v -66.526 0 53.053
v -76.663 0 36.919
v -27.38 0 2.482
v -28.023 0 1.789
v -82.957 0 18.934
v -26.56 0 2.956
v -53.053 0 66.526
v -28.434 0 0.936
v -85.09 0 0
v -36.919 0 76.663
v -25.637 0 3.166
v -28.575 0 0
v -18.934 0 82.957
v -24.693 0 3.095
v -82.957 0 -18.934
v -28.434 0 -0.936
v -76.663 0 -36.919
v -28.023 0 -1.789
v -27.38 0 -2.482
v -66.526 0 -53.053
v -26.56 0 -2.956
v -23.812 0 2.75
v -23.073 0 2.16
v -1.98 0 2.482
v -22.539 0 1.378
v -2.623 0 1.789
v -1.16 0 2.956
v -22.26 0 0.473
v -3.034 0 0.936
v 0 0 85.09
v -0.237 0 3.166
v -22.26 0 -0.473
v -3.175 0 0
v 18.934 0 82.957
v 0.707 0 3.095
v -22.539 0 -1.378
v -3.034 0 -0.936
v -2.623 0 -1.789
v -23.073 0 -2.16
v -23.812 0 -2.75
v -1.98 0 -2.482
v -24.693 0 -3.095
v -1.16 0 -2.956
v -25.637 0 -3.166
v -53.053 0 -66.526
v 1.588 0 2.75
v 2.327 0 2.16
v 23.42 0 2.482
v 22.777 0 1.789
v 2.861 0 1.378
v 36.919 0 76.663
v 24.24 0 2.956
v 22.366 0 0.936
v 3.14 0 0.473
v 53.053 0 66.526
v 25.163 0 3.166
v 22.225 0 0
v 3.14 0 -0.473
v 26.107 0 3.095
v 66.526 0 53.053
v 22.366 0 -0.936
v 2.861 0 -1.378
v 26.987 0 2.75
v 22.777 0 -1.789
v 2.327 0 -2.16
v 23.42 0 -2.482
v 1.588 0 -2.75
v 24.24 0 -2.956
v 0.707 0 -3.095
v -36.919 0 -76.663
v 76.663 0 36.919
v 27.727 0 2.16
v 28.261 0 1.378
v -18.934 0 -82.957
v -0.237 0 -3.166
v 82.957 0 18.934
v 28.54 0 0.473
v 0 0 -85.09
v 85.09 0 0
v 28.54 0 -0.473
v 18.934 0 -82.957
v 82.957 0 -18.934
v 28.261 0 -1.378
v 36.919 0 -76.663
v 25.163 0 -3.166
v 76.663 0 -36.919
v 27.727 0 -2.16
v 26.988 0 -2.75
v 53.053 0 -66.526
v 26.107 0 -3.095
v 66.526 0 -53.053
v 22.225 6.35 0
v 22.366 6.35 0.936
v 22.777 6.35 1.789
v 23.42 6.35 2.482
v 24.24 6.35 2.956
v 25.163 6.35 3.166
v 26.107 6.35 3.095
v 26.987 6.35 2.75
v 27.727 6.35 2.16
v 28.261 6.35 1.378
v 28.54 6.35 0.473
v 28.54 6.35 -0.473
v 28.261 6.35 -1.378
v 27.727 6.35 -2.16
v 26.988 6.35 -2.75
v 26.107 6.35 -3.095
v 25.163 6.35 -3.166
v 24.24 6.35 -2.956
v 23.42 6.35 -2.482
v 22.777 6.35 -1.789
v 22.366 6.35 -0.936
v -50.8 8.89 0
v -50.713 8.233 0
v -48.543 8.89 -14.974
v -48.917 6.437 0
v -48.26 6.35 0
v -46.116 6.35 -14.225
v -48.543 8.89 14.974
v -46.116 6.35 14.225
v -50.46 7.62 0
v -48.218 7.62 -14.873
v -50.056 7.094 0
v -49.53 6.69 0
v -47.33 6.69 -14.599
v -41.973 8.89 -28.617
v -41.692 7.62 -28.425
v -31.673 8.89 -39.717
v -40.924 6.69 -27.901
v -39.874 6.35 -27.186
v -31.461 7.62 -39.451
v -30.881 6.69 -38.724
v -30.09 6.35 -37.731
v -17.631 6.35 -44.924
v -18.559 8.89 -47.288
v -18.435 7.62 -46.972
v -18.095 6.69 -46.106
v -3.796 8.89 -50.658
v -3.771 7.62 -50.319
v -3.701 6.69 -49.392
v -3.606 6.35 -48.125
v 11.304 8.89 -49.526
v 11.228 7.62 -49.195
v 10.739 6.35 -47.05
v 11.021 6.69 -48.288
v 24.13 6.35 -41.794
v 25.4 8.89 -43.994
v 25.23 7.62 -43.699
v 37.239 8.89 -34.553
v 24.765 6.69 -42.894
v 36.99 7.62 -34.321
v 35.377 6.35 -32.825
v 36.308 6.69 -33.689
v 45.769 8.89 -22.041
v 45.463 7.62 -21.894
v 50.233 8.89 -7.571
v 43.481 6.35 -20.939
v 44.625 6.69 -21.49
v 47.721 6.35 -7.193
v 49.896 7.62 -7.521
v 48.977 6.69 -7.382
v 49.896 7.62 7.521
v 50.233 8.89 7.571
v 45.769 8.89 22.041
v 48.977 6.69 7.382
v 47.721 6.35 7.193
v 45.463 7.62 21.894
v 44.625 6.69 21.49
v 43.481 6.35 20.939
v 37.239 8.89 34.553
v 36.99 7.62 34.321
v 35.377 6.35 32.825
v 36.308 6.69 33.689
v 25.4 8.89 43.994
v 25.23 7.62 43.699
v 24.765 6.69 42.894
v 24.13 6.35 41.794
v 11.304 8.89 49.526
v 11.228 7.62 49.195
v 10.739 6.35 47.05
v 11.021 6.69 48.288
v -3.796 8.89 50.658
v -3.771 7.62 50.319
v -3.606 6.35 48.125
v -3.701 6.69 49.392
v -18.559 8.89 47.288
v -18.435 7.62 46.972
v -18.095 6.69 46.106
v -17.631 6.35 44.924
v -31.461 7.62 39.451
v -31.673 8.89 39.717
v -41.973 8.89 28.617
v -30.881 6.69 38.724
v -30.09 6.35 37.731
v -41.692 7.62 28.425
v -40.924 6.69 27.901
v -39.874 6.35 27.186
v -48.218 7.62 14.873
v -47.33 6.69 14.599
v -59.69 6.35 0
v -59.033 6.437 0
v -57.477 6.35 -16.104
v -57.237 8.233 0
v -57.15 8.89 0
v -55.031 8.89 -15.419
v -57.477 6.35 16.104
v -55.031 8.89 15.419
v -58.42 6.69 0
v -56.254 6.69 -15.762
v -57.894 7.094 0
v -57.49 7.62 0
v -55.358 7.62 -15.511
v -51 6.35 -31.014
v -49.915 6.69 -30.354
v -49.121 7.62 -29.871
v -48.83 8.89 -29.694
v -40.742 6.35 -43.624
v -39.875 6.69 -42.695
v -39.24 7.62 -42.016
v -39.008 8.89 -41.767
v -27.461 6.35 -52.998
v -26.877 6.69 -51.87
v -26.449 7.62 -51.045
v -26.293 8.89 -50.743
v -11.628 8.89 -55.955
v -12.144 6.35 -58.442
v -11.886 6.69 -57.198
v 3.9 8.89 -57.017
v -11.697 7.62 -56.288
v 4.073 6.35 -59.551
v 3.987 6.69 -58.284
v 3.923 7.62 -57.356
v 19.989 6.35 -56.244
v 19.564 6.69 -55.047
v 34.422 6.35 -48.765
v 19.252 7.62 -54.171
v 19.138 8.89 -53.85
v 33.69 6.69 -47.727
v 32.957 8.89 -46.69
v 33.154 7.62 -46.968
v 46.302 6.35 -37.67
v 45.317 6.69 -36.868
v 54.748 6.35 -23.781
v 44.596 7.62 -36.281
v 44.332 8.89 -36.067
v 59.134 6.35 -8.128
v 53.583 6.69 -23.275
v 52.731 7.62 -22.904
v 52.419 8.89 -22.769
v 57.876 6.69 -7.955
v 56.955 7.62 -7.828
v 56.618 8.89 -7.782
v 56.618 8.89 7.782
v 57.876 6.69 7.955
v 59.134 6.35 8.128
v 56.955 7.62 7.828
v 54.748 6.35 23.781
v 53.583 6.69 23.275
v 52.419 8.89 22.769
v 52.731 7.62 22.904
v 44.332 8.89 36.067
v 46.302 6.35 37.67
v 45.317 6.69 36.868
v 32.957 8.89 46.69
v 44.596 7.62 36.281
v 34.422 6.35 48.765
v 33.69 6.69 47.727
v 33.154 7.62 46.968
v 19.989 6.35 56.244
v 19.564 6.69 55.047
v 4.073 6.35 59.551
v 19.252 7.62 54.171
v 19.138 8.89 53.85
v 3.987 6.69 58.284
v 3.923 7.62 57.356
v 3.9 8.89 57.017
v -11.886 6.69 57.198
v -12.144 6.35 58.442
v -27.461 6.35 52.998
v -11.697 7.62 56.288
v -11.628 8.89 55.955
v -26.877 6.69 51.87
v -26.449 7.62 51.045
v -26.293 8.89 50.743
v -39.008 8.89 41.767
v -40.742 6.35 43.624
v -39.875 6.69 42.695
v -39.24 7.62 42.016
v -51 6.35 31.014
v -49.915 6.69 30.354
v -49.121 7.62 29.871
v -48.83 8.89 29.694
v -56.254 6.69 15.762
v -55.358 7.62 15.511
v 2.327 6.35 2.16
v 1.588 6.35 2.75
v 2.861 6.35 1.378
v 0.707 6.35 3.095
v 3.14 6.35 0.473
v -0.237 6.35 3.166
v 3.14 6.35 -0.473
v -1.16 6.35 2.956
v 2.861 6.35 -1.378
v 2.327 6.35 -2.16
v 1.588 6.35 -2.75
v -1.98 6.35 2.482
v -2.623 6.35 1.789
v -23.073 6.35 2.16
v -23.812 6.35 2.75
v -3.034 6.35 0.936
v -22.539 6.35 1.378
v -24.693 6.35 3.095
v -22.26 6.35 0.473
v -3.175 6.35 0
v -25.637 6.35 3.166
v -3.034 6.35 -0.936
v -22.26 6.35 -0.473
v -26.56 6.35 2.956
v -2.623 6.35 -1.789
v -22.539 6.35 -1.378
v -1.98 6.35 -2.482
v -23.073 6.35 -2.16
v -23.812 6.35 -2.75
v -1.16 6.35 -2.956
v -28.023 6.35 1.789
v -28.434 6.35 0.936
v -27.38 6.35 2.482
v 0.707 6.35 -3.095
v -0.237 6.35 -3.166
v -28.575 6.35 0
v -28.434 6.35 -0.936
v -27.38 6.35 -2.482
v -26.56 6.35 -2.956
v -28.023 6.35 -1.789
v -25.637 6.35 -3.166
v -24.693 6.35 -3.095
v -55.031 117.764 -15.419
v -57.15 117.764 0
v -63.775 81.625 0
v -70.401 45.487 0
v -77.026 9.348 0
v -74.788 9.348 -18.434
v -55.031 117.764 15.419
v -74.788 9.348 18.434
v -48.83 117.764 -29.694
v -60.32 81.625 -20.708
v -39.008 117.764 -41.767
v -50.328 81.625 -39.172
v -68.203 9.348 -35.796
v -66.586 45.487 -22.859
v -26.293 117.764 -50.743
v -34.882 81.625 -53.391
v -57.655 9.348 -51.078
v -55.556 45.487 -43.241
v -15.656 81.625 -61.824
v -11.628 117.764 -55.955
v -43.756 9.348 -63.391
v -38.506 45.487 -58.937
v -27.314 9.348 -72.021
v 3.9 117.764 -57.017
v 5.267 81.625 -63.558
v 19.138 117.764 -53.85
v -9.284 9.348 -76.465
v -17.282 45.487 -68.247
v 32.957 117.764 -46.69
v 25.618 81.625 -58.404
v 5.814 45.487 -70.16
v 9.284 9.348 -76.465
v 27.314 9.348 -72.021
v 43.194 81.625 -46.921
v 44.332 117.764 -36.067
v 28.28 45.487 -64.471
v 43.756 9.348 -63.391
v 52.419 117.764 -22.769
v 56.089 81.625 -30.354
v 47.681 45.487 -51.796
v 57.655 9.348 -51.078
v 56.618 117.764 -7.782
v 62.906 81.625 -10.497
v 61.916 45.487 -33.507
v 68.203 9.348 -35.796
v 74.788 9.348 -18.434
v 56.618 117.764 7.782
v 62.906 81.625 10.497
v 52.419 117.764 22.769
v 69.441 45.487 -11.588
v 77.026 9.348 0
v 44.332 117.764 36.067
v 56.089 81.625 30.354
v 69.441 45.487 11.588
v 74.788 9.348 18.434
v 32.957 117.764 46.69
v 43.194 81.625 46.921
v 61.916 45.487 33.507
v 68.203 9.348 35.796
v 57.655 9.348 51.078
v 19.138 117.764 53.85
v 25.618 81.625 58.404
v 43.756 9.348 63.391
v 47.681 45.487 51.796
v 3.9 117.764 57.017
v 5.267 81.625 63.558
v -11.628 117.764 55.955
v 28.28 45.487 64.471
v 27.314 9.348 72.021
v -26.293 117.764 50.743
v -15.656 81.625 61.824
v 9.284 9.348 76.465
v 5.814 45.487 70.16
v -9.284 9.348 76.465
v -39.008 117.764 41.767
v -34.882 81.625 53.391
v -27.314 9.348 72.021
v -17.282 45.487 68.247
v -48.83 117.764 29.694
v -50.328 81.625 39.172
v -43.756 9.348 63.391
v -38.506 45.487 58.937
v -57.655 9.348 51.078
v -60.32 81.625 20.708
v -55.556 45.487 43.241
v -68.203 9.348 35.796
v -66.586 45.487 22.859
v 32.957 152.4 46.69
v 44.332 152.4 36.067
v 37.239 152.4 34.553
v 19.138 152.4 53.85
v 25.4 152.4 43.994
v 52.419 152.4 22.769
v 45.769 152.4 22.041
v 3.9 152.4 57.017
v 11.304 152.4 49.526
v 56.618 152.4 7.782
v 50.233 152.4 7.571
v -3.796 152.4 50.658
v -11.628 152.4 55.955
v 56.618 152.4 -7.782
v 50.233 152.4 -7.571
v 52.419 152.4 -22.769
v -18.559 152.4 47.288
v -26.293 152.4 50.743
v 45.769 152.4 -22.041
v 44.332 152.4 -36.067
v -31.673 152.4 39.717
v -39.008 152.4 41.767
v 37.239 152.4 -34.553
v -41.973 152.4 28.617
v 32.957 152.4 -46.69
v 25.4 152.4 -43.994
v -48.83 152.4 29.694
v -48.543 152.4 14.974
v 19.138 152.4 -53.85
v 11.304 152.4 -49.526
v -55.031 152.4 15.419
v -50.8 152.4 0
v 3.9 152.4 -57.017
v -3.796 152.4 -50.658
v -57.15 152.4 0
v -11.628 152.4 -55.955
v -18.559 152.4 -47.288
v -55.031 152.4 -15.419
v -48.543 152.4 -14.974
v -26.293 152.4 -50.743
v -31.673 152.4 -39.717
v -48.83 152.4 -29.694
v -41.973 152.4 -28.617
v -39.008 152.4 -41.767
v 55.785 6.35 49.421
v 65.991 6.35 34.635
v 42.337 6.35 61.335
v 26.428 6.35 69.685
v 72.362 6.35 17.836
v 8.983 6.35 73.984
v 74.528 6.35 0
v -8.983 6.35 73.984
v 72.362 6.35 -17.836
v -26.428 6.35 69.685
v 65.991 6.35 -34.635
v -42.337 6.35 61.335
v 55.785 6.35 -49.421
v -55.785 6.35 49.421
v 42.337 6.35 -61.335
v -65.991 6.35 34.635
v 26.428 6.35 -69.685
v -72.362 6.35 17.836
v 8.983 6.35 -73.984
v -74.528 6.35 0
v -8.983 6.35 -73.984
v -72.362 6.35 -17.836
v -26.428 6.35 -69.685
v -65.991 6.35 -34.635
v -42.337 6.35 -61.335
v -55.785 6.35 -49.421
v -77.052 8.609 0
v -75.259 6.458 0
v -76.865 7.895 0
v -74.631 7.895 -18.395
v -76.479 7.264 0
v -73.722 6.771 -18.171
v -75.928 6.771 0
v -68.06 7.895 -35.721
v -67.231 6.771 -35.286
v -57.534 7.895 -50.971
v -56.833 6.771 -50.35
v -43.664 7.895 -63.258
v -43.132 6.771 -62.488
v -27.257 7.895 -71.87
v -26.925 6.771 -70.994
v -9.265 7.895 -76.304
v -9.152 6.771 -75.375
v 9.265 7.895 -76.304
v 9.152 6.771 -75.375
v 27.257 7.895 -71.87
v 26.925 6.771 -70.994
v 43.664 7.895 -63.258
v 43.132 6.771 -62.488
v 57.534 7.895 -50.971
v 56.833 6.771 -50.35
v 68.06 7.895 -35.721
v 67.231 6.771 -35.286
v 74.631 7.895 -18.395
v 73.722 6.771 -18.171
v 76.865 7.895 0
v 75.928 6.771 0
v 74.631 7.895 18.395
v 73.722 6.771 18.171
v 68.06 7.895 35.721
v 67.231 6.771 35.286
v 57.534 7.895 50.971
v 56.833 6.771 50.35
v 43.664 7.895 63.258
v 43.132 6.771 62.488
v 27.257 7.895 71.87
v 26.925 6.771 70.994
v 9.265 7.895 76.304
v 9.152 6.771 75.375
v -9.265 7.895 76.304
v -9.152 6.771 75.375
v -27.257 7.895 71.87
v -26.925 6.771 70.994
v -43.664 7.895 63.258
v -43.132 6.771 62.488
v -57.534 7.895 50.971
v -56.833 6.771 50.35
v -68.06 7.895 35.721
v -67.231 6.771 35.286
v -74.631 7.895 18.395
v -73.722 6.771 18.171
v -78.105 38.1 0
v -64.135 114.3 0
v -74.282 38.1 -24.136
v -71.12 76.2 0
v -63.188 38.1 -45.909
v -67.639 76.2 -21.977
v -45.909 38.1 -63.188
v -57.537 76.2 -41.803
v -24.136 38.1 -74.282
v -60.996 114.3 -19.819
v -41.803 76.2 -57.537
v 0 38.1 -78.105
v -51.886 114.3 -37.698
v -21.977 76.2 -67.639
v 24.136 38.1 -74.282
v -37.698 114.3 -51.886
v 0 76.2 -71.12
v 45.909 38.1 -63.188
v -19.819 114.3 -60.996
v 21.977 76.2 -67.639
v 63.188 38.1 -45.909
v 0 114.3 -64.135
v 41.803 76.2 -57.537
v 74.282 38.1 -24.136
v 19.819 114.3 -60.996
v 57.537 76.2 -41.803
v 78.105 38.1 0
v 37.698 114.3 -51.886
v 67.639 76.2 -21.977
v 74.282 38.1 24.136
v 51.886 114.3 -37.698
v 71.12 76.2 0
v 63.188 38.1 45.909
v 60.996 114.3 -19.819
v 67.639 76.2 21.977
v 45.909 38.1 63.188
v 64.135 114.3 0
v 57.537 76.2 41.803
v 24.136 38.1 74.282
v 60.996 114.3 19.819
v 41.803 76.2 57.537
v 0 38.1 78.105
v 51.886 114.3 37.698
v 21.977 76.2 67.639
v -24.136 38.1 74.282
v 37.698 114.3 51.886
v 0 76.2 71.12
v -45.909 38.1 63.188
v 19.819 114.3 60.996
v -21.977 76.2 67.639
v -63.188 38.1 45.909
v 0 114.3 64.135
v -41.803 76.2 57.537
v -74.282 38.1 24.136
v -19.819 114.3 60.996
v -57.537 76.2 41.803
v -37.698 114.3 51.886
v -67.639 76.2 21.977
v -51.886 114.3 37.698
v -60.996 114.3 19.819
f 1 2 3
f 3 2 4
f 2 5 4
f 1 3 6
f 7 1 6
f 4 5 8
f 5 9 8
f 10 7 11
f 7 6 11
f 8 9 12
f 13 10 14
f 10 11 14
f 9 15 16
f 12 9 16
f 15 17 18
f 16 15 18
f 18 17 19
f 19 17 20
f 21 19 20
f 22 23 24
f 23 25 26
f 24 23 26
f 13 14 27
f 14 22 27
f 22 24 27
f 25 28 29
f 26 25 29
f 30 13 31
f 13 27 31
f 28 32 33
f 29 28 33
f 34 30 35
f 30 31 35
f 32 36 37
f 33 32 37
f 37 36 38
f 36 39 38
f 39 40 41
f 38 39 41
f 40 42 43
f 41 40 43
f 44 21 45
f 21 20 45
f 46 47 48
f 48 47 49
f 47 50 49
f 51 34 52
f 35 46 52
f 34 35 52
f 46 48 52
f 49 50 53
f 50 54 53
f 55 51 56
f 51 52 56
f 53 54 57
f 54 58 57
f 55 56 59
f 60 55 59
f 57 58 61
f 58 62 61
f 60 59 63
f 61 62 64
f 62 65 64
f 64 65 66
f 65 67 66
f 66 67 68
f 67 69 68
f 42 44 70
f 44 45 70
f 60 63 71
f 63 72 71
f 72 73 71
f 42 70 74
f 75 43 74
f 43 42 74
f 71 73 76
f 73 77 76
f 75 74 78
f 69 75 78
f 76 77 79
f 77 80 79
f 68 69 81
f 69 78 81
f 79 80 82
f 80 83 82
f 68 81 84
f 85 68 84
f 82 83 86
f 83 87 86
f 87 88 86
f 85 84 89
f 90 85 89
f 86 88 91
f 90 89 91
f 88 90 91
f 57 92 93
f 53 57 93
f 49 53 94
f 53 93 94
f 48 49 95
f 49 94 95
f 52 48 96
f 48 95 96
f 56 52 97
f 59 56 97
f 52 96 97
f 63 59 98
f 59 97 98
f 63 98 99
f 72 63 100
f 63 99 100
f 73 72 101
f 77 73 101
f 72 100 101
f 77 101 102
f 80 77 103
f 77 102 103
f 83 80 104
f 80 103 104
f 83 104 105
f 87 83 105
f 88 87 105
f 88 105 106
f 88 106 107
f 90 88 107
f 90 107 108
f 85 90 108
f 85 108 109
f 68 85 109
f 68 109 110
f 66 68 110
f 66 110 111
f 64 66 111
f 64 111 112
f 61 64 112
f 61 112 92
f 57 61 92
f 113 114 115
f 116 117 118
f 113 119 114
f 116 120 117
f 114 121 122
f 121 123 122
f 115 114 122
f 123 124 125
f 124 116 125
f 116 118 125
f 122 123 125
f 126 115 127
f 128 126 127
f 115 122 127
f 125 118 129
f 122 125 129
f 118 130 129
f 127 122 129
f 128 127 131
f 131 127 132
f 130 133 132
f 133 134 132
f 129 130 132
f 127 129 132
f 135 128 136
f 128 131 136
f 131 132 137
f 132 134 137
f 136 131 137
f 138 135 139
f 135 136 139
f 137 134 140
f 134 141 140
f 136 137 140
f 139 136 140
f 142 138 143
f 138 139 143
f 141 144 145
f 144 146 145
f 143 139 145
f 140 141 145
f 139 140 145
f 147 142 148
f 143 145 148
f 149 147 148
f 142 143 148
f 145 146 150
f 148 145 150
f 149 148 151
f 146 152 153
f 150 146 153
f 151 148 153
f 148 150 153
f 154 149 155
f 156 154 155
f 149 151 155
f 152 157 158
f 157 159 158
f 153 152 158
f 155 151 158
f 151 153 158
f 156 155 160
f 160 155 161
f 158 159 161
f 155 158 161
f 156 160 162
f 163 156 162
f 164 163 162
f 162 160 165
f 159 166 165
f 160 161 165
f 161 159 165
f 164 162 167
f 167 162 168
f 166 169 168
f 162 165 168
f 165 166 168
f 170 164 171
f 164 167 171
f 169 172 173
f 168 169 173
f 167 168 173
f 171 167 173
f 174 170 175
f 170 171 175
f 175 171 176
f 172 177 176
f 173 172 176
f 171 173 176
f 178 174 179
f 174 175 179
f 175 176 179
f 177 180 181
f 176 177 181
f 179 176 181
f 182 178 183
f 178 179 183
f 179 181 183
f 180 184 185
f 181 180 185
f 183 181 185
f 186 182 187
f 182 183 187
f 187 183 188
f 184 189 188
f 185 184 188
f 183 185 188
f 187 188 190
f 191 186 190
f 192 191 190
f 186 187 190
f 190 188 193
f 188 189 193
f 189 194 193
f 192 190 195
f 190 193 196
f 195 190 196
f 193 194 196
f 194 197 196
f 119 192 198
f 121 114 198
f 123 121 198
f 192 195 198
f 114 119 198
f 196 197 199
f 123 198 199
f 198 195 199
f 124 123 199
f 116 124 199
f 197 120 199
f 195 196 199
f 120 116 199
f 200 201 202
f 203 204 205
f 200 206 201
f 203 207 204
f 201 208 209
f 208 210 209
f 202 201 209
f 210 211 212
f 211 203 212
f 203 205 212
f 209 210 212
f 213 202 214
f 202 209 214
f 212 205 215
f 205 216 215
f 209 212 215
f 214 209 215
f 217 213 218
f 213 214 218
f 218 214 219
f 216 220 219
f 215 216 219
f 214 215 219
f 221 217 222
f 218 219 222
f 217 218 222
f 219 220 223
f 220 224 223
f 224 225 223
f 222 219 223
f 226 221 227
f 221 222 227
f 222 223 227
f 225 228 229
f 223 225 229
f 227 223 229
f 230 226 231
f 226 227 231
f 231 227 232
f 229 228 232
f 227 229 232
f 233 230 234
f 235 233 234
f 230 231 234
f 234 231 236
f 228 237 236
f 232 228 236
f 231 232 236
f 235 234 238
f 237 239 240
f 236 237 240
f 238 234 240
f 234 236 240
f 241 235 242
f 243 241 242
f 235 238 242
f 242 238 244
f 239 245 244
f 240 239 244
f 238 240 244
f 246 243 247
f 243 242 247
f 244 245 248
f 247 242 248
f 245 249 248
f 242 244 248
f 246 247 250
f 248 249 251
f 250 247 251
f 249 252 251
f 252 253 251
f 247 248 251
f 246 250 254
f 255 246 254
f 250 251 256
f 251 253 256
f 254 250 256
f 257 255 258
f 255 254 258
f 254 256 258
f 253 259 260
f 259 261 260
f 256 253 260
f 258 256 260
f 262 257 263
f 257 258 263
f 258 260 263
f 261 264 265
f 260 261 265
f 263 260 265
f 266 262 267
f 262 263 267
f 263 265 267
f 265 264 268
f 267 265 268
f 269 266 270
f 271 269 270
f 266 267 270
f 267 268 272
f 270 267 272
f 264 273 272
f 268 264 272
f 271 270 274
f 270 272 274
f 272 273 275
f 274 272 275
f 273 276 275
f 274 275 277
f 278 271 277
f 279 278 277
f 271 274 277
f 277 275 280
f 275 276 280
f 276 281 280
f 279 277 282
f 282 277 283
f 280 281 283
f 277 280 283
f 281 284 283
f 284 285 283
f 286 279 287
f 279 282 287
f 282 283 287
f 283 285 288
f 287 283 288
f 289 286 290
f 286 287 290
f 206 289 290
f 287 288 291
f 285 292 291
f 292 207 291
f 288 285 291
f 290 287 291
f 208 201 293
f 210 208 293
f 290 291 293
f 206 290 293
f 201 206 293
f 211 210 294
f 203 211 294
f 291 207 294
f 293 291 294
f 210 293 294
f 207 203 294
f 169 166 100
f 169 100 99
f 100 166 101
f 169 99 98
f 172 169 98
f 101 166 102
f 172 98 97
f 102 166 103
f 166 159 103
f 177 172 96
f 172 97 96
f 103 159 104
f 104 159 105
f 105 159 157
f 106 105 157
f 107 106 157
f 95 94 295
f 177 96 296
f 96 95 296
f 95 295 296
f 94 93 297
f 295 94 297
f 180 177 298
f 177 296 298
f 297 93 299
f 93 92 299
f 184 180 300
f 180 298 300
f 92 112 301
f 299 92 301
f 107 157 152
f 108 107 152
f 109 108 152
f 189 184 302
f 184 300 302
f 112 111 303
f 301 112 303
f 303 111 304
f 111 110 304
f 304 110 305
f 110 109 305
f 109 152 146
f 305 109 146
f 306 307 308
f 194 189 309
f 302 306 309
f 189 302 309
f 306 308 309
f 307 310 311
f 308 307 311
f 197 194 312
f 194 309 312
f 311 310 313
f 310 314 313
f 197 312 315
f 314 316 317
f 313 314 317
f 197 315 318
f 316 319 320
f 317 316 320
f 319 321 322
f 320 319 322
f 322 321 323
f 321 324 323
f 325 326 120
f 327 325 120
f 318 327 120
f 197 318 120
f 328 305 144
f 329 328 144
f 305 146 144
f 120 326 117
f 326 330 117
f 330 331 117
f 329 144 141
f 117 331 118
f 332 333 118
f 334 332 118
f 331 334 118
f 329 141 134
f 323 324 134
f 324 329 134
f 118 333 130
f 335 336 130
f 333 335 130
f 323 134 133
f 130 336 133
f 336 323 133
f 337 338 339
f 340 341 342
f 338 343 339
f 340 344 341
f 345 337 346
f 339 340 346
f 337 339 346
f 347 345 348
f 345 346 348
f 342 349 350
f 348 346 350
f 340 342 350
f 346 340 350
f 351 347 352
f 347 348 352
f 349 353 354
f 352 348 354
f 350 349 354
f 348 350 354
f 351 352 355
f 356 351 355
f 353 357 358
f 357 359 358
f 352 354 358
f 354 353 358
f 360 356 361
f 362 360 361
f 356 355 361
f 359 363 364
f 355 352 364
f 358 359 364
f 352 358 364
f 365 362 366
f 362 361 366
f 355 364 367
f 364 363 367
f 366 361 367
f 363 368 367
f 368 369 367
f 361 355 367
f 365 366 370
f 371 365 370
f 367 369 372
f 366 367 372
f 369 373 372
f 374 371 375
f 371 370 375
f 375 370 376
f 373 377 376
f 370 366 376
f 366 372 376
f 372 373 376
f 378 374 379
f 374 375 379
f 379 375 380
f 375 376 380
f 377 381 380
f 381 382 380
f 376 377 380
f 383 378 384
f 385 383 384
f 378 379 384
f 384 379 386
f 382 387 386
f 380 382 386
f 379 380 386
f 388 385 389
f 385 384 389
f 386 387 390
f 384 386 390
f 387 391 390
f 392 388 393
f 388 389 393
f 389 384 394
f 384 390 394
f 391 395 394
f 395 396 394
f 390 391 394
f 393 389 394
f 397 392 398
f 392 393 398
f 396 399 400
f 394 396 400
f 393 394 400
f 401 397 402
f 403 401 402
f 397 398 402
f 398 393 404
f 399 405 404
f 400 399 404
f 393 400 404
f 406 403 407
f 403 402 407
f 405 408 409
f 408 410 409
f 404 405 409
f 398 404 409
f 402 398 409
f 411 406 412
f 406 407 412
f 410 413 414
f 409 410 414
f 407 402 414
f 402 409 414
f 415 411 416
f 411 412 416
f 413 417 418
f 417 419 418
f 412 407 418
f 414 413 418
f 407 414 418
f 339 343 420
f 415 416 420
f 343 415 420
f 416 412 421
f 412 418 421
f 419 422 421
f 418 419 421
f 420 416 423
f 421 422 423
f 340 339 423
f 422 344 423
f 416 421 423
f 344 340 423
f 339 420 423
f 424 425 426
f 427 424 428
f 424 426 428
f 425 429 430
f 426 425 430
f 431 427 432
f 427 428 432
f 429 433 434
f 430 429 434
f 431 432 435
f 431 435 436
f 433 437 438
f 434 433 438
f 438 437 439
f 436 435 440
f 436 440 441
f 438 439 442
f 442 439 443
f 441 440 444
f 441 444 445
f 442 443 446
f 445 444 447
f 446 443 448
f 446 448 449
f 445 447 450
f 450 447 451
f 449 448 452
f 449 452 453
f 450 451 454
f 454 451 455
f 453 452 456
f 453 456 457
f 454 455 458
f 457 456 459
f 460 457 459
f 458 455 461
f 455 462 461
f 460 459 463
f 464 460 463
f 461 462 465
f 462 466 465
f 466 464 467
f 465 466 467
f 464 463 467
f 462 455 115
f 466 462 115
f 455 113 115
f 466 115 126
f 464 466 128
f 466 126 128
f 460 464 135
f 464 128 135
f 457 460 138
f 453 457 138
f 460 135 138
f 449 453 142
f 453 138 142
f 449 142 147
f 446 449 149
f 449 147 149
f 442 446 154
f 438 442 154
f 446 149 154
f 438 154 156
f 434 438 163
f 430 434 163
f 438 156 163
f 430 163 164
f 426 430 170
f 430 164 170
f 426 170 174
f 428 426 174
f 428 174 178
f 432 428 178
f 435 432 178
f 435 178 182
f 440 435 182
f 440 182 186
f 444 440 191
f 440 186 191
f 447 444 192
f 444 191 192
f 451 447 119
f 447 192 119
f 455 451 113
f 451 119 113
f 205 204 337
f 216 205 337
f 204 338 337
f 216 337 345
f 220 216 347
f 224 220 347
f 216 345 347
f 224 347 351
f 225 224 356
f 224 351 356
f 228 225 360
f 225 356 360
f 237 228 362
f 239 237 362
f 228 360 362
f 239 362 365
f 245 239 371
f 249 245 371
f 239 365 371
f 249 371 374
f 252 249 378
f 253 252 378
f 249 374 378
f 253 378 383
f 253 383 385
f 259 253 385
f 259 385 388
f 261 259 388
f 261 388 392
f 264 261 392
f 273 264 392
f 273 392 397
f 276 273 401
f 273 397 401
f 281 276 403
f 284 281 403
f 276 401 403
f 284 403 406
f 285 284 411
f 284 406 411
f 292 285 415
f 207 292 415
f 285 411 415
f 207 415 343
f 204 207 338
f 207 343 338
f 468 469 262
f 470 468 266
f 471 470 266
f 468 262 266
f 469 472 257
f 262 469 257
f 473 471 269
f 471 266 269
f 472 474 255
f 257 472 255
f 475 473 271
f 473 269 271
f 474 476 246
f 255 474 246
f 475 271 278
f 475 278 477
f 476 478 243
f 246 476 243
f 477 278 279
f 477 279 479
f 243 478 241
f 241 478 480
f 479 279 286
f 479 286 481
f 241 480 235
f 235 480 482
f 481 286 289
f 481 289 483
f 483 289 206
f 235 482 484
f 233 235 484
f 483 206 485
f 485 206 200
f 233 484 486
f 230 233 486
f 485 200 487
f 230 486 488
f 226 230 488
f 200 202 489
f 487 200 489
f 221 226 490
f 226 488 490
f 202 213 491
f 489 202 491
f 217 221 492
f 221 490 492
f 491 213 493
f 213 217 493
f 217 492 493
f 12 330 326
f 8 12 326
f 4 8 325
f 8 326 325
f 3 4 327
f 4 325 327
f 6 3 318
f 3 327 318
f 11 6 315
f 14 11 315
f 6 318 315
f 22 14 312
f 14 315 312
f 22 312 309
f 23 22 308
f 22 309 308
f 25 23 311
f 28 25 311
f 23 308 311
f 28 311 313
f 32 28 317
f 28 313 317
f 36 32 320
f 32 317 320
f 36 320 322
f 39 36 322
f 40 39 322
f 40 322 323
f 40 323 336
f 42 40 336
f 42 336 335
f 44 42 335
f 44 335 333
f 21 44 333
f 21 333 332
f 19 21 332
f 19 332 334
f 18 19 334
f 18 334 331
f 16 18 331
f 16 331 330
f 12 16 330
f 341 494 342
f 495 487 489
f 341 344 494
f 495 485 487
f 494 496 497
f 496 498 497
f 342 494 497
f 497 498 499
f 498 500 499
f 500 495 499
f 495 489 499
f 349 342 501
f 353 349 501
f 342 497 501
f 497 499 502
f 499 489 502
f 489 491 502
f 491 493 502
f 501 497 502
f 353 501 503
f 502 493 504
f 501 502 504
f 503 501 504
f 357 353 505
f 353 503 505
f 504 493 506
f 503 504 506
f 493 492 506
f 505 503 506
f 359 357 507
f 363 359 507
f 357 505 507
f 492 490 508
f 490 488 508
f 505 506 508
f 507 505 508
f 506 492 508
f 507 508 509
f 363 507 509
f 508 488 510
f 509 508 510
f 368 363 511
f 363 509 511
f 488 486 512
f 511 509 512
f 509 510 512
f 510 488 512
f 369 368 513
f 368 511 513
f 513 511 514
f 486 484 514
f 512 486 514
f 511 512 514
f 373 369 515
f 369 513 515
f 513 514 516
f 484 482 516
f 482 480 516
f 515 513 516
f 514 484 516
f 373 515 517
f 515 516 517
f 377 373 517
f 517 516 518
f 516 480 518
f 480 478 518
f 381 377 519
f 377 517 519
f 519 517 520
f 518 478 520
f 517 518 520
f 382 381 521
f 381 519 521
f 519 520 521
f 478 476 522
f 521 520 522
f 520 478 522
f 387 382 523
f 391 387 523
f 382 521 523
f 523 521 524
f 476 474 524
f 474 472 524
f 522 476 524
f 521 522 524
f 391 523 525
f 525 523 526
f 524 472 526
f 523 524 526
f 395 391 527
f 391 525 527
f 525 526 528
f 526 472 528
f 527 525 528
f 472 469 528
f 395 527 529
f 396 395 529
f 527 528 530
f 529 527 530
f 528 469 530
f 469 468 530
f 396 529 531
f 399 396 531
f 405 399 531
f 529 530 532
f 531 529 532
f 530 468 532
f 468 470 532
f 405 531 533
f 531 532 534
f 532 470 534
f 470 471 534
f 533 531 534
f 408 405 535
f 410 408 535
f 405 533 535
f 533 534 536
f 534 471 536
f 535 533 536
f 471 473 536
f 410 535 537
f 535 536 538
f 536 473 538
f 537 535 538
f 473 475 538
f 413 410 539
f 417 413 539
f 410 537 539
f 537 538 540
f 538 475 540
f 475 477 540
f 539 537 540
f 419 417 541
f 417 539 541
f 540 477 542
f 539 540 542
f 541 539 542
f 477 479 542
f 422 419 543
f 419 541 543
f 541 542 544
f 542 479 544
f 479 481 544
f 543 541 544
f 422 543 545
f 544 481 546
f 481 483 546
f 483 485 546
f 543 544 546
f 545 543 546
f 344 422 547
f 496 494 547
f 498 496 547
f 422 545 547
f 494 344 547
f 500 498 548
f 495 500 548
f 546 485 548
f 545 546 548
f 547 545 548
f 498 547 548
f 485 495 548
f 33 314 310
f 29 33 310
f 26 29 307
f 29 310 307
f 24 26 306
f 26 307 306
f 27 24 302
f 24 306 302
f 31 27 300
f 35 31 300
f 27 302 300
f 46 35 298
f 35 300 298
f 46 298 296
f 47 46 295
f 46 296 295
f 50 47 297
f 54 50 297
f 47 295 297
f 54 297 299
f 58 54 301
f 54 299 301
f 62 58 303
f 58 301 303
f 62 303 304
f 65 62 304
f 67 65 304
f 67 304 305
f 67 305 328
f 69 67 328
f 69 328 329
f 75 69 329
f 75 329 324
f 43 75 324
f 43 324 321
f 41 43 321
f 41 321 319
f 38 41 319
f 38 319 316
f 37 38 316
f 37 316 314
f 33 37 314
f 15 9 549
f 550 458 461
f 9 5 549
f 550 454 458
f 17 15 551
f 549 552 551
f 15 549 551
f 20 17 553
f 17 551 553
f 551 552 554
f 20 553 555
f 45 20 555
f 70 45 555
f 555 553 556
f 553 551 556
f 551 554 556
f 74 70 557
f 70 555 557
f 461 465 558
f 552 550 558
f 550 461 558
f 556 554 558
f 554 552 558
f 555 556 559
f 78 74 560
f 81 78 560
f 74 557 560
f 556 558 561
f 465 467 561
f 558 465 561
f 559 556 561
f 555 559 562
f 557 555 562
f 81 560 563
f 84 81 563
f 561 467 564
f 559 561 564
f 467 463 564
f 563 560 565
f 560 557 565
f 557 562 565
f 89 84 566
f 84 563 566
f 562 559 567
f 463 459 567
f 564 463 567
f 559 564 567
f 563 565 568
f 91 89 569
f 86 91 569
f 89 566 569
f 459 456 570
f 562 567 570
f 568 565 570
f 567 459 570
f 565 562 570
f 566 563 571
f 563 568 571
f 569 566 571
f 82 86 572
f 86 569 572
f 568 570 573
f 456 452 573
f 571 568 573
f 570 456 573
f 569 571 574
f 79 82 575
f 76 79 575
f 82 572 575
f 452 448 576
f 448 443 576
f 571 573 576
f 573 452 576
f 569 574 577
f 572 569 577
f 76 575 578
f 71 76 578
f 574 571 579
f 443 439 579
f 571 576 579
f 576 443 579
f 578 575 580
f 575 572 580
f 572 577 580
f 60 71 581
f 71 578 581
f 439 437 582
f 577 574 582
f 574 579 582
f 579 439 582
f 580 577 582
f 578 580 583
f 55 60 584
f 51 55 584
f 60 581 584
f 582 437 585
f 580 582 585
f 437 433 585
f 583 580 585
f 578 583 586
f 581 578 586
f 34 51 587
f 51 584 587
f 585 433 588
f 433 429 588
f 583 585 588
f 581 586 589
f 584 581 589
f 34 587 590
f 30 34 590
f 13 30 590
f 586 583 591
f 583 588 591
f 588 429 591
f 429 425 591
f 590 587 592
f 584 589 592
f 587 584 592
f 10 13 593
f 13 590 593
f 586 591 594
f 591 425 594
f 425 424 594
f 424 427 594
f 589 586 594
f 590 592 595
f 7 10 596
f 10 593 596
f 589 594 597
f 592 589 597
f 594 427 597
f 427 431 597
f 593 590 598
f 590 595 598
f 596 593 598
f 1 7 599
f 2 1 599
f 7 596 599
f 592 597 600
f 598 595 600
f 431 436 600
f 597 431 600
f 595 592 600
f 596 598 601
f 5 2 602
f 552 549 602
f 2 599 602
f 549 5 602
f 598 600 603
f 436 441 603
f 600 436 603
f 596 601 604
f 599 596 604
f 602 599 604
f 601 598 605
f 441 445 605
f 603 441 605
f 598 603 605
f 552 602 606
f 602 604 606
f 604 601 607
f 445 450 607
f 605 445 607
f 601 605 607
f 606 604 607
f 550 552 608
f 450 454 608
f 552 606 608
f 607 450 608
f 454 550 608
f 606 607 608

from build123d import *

# Parameters (mm, degrees)
CUT_EXTRUDE1_REACH = 191.239
SKETCH2_R          = 3.175


with BuildPart() as part:
    # Sketch1 → Revolve1 (revolve)
    with BuildSketch(Plane.XY):
        with BuildLine():
            Line((0, 0), (-78.74, 0))
            Line((-78.74, 0), (-85.09, 0))
            Line((-85.09, 0), (-57.15, 152.4))
            Line((-57.15, 152.4), (-50.8, 152.4))
            Line((-50.8, 152.4), (-50.8, 8.89))
            ThreePointArc((-50.8, 8.89), (-50.056051224, 7.093948776), (-48.26, 6.35))
            Line((-48.26, 6.35), (0, 6.35))
            Line((0, 6.35), (0, 0))
        make_face()
        with BuildLine():
            Line((-57.15, 8.89), (-57.15, 117.763636364))
            Line((-57.15, 117.763636364), (-77.026193989, 9.348032787))
            ThreePointArc((-77.026193989, 9.348032787), (-76.479115384, 7.263931625), (-74.527833333, 6.35))
            Line((-74.527833333, 6.35), (-59.69, 6.35))
            ThreePointArc((-59.69, 6.35), (-57.893948776, 7.093948776), (-57.15, 8.89))
        make_face(mode=Mode.SUBTRACT)
    revolve(axis=Axis((0, 152.4, 0), (0, -1, 0)))

    # Sketch2 → Cut-Extrude1 (cut, up to next)
    with BuildSketch(Plane(origin=(0, 6.35, 0), x_dir=(1, 0, 0), z_dir=(0, 1, 0)), mode=Mode.PRIVATE) as cut_extrude1_sk1:
        with Locations(Location((0, 0, 0), (0, 0, 180))):
            Circle(SKETCH2_R)
    cut_extrude1_tool1 = extrude(cut_extrude1_sk1.sketch, amount=-CUT_EXTRUDE1_REACH, mode=Mode.PRIVATE) & part.part
    # Sketch2 → Cut-Extrude1 (cut, up to next)
    with BuildSketch(Plane(origin=(0, 6.35, 0), x_dir=(1, 0, 0), z_dir=(0, 1, 0)), mode=Mode.PRIVATE) as cut_extrude1_sk2:
        with Locations(Location((25.4, 0, 0), (0, 0, 180))):
            Circle(SKETCH2_R)
    cut_extrude1_tool2 = extrude(cut_extrude1_sk2.sketch, amount=-CUT_EXTRUDE1_REACH, mode=Mode.PRIVATE) & part.part
    # Sketch2 → Cut-Extrude1 (cut, up to next)
    with BuildSketch(Plane(origin=(0, 6.35, 0), x_dir=(1, 0, 0), z_dir=(0, 1, 0)), mode=Mode.PRIVATE) as cut_extrude1_sk3:
        with Locations(Location((-25.4, 0, 0), (0, 0, 180))):
            Circle(SKETCH2_R)
    cut_extrude1_tool3 = extrude(cut_extrude1_sk3.sketch, amount=-CUT_EXTRUDE1_REACH, mode=Mode.PRIVATE) & part.part
    add(cut_extrude1_tool1.solids().sort_by_distance((0, 6.35, 0))[0], mode=Mode.SUBTRACT)
    add(cut_extrude1_tool2.solids().sort_by_distance((25.4, 6.35, 0))[0], mode=Mode.SUBTRACT)
    add(cut_extrude1_tool3.solids().sort_by_distance((-25.4, 6.35, 0))[0], mode=Mode.SUBTRACT)


solid = part.part
